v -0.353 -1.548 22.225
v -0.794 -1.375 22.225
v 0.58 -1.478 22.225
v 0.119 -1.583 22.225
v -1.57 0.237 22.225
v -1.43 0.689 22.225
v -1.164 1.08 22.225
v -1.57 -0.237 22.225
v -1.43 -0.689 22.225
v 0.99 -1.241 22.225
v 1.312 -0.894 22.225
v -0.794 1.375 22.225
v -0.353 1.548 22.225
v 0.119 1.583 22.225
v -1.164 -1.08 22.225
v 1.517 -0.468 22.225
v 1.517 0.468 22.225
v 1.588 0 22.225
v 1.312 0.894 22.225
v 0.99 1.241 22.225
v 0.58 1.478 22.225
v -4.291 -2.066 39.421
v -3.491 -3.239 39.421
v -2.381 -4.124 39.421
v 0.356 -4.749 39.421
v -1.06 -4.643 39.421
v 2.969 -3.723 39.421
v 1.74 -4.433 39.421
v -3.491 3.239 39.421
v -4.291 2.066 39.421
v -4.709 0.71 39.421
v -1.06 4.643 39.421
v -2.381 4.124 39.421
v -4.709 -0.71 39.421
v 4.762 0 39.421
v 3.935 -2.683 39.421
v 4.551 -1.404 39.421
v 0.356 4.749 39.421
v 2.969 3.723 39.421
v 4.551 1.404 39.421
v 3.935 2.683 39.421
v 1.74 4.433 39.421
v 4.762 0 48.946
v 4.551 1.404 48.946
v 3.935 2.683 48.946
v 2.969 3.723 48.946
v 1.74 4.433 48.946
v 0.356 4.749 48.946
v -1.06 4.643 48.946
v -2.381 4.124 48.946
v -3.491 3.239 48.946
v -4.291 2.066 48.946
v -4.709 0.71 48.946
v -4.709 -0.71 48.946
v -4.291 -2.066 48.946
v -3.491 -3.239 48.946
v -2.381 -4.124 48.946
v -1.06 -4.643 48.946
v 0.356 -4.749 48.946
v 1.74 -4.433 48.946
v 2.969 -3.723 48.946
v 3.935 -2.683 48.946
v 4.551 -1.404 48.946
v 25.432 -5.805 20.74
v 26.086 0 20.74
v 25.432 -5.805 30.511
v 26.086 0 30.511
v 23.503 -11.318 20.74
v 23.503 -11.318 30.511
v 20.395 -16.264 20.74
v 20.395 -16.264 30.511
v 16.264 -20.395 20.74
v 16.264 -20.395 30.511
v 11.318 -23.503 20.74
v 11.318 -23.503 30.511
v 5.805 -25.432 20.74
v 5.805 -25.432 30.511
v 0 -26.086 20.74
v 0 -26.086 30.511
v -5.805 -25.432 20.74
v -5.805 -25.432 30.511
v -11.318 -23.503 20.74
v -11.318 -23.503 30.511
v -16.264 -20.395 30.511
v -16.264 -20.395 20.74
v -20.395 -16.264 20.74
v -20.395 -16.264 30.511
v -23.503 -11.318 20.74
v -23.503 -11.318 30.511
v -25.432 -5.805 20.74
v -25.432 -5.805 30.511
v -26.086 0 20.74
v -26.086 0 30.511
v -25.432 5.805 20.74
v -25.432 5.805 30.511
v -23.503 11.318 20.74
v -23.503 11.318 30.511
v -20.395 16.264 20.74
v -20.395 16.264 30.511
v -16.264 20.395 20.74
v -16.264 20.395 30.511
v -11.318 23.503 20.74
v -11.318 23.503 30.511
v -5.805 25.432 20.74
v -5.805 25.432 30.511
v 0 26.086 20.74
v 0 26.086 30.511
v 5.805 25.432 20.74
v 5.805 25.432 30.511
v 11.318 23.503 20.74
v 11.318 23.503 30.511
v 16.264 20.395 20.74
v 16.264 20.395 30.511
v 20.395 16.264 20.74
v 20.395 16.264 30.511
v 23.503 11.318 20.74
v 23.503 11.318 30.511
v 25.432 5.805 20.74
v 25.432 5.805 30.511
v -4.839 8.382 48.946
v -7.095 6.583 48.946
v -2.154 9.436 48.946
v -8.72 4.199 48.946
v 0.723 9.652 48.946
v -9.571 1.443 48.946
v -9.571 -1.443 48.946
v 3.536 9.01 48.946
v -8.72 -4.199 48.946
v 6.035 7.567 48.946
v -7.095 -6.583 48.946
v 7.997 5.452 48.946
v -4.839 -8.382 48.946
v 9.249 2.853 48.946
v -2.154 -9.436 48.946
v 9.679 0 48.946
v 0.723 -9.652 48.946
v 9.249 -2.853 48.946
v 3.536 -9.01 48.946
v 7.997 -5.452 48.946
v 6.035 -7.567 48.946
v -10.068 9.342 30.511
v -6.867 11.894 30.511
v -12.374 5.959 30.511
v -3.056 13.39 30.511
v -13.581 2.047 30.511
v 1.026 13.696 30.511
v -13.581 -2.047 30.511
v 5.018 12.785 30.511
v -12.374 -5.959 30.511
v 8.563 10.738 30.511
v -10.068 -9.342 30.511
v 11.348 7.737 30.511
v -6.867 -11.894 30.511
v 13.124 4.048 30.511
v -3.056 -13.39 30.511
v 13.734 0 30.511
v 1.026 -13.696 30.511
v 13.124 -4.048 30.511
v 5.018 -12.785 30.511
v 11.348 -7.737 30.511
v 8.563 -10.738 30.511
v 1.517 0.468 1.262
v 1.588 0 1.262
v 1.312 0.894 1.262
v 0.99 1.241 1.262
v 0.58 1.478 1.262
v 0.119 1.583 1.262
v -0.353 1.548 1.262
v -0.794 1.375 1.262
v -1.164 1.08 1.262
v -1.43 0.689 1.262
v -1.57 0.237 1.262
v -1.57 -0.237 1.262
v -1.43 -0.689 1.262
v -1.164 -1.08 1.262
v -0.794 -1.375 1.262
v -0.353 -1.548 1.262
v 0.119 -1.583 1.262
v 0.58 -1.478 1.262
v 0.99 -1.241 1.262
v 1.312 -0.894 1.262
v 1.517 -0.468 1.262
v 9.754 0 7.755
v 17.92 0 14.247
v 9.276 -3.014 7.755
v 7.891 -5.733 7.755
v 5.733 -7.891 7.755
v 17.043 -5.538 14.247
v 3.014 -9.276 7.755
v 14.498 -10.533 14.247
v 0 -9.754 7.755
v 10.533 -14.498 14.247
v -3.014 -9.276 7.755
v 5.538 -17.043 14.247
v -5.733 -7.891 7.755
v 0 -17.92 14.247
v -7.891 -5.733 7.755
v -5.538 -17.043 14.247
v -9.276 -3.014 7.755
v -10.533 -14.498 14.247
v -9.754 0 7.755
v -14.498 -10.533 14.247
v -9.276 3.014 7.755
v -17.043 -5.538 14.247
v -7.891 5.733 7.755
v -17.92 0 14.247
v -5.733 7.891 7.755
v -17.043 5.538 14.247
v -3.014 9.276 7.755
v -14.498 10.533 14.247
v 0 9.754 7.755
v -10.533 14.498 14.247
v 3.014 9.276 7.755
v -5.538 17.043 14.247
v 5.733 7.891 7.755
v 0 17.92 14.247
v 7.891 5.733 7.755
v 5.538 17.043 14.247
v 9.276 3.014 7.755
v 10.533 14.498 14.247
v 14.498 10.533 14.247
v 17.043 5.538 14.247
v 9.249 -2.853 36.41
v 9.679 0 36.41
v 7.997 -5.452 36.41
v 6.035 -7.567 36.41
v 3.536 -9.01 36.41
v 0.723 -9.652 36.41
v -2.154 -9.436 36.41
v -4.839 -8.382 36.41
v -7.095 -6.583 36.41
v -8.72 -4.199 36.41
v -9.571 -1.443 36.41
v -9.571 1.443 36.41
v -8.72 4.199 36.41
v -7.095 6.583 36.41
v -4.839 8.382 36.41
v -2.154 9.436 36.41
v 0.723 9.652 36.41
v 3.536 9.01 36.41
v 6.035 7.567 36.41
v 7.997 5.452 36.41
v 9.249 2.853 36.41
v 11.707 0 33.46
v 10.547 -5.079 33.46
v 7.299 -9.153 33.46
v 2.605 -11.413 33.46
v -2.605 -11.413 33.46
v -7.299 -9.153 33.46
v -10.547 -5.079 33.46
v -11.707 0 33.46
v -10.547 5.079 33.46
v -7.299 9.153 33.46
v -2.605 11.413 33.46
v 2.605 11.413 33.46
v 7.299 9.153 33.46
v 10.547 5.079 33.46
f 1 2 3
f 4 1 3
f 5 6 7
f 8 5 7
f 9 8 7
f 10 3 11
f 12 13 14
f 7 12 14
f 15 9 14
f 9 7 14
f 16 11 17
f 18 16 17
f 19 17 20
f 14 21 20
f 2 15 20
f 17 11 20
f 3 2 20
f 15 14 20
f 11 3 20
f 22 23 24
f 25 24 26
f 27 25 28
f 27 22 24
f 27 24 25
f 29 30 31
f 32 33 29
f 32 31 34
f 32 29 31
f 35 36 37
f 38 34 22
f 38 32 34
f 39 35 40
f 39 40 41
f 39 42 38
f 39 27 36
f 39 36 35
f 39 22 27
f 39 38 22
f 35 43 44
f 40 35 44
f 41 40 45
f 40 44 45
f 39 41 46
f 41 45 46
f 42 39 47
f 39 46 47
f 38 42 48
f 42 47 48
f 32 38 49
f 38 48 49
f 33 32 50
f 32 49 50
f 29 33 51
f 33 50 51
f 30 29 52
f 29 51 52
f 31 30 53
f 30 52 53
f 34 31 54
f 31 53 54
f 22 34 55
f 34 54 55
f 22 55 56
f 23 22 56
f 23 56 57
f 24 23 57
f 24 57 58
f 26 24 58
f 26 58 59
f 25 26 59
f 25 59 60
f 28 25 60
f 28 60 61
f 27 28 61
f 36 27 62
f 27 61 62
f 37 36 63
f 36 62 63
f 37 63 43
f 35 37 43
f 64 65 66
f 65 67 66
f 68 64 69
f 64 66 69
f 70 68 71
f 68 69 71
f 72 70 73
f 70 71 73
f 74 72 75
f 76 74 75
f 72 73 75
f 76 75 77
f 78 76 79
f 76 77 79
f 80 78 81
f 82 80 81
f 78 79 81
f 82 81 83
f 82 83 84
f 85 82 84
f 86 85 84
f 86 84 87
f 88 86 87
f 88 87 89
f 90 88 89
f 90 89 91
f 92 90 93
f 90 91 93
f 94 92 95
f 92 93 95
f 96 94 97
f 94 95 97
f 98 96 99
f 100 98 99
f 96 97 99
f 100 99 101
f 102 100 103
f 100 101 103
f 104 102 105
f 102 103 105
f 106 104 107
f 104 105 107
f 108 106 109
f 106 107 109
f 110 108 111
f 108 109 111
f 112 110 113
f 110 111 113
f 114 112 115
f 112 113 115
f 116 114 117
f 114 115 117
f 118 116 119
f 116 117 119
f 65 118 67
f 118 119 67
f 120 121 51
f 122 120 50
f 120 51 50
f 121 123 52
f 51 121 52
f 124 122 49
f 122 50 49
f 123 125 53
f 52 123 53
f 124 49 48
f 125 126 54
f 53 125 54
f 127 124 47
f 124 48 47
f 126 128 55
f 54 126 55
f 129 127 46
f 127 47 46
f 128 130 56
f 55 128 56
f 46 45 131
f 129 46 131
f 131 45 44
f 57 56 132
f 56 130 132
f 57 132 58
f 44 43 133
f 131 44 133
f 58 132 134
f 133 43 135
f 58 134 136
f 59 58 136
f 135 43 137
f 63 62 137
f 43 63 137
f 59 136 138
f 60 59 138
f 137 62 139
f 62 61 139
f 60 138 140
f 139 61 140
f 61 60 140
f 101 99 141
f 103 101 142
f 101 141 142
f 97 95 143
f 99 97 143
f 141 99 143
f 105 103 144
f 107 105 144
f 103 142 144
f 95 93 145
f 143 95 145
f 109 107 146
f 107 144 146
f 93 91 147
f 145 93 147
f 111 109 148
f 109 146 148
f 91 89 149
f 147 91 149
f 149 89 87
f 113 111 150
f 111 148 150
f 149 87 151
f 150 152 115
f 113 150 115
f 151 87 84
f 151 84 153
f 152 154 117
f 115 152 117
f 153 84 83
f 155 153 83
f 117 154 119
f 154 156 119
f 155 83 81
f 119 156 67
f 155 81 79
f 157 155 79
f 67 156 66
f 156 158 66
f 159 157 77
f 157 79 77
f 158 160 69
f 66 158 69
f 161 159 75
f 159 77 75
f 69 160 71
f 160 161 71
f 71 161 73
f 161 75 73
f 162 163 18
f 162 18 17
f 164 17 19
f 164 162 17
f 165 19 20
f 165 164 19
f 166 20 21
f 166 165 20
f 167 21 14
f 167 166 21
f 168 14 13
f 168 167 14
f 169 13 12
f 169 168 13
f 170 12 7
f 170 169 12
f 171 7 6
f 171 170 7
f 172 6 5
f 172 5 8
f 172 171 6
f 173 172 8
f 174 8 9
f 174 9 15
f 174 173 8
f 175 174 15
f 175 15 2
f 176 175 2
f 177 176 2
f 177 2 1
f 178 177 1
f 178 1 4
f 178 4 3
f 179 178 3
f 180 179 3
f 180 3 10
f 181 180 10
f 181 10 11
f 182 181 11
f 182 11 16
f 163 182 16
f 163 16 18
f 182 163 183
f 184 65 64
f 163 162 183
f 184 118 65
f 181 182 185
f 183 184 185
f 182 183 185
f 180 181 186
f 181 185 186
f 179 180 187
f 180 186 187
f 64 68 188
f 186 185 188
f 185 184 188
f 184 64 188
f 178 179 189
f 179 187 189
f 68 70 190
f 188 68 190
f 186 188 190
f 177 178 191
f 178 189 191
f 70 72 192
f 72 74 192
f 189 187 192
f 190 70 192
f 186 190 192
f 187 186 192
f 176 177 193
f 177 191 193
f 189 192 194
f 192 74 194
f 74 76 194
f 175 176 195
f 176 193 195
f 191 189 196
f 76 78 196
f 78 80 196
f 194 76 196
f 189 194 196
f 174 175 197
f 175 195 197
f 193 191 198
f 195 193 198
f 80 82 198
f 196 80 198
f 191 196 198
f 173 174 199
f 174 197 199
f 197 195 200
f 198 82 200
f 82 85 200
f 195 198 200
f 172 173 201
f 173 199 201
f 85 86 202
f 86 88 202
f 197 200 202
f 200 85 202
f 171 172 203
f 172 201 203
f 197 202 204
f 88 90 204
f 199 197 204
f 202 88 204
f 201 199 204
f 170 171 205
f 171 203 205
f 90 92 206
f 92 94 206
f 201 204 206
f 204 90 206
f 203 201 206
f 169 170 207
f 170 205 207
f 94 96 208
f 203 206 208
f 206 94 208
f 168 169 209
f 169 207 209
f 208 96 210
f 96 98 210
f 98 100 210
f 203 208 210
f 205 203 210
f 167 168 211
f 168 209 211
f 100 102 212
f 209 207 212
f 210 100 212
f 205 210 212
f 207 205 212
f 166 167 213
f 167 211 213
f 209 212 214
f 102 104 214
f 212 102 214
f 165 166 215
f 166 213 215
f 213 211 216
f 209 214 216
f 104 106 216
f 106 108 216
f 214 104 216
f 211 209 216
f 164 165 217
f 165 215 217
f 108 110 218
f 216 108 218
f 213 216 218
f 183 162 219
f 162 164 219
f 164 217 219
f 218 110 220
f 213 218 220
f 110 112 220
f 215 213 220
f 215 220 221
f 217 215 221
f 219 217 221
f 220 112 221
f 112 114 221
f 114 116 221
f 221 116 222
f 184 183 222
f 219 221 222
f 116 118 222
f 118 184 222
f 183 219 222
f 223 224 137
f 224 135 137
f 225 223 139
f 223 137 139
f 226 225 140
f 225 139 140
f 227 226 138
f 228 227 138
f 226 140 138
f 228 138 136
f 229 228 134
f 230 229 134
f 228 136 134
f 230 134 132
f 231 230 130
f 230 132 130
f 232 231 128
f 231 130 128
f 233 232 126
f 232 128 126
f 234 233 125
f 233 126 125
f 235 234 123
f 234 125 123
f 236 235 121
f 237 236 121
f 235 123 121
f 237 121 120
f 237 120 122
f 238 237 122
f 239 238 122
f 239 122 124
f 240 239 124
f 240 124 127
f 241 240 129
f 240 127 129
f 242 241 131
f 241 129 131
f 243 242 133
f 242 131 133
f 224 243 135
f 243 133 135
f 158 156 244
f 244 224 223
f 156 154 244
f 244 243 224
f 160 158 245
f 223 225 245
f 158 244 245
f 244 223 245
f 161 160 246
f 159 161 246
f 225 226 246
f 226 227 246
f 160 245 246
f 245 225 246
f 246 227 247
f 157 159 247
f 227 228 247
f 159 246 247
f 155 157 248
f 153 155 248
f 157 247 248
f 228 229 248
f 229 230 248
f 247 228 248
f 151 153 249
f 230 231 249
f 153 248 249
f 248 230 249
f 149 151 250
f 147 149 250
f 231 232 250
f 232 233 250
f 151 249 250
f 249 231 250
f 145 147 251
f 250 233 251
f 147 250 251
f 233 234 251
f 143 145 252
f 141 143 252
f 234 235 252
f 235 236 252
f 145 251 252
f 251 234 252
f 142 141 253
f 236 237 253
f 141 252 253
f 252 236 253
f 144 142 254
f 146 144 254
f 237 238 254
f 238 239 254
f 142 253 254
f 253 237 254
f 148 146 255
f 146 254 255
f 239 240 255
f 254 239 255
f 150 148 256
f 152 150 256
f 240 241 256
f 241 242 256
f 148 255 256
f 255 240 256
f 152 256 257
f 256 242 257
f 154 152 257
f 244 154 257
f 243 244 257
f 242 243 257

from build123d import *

# Parameters (mm, degrees)
F2_R     = 4.7625
F3_DEPTH = 9.525
F4_R     = 1.5875
F5_DEPTH = 22.225


with BuildPart() as f1:
    # F0 (on Front) → F1 (revolve)
    with BuildSketch(Plane.XZ):
        Polygon((0, 48.946209), (0, 0), (26.086207, 20.739919), (26.086207, 30.510725), (13.734438, 30.510725), (9.678629, 36.410082), (9.678629, 48.946209), align=None)
    revolve(axis=Axis((0, 0, 24.473105), (0, 0, -1)))

    # F2 (on face) → F3 (cut)
    with BuildSketch(Plane.XY.offset(48.946209)):
        Circle(F2_R)
    extrude(amount=-F3_DEPTH, mode=Mode.SUBTRACT)

    # F4 (on Top) → F5 (cut)
    with BuildSketch(Plane.XY):
        Circle(F4_R)
    extrude(amount=F5_DEPTH, mode=Mode.SUBTRACT)


solid = f1.part
